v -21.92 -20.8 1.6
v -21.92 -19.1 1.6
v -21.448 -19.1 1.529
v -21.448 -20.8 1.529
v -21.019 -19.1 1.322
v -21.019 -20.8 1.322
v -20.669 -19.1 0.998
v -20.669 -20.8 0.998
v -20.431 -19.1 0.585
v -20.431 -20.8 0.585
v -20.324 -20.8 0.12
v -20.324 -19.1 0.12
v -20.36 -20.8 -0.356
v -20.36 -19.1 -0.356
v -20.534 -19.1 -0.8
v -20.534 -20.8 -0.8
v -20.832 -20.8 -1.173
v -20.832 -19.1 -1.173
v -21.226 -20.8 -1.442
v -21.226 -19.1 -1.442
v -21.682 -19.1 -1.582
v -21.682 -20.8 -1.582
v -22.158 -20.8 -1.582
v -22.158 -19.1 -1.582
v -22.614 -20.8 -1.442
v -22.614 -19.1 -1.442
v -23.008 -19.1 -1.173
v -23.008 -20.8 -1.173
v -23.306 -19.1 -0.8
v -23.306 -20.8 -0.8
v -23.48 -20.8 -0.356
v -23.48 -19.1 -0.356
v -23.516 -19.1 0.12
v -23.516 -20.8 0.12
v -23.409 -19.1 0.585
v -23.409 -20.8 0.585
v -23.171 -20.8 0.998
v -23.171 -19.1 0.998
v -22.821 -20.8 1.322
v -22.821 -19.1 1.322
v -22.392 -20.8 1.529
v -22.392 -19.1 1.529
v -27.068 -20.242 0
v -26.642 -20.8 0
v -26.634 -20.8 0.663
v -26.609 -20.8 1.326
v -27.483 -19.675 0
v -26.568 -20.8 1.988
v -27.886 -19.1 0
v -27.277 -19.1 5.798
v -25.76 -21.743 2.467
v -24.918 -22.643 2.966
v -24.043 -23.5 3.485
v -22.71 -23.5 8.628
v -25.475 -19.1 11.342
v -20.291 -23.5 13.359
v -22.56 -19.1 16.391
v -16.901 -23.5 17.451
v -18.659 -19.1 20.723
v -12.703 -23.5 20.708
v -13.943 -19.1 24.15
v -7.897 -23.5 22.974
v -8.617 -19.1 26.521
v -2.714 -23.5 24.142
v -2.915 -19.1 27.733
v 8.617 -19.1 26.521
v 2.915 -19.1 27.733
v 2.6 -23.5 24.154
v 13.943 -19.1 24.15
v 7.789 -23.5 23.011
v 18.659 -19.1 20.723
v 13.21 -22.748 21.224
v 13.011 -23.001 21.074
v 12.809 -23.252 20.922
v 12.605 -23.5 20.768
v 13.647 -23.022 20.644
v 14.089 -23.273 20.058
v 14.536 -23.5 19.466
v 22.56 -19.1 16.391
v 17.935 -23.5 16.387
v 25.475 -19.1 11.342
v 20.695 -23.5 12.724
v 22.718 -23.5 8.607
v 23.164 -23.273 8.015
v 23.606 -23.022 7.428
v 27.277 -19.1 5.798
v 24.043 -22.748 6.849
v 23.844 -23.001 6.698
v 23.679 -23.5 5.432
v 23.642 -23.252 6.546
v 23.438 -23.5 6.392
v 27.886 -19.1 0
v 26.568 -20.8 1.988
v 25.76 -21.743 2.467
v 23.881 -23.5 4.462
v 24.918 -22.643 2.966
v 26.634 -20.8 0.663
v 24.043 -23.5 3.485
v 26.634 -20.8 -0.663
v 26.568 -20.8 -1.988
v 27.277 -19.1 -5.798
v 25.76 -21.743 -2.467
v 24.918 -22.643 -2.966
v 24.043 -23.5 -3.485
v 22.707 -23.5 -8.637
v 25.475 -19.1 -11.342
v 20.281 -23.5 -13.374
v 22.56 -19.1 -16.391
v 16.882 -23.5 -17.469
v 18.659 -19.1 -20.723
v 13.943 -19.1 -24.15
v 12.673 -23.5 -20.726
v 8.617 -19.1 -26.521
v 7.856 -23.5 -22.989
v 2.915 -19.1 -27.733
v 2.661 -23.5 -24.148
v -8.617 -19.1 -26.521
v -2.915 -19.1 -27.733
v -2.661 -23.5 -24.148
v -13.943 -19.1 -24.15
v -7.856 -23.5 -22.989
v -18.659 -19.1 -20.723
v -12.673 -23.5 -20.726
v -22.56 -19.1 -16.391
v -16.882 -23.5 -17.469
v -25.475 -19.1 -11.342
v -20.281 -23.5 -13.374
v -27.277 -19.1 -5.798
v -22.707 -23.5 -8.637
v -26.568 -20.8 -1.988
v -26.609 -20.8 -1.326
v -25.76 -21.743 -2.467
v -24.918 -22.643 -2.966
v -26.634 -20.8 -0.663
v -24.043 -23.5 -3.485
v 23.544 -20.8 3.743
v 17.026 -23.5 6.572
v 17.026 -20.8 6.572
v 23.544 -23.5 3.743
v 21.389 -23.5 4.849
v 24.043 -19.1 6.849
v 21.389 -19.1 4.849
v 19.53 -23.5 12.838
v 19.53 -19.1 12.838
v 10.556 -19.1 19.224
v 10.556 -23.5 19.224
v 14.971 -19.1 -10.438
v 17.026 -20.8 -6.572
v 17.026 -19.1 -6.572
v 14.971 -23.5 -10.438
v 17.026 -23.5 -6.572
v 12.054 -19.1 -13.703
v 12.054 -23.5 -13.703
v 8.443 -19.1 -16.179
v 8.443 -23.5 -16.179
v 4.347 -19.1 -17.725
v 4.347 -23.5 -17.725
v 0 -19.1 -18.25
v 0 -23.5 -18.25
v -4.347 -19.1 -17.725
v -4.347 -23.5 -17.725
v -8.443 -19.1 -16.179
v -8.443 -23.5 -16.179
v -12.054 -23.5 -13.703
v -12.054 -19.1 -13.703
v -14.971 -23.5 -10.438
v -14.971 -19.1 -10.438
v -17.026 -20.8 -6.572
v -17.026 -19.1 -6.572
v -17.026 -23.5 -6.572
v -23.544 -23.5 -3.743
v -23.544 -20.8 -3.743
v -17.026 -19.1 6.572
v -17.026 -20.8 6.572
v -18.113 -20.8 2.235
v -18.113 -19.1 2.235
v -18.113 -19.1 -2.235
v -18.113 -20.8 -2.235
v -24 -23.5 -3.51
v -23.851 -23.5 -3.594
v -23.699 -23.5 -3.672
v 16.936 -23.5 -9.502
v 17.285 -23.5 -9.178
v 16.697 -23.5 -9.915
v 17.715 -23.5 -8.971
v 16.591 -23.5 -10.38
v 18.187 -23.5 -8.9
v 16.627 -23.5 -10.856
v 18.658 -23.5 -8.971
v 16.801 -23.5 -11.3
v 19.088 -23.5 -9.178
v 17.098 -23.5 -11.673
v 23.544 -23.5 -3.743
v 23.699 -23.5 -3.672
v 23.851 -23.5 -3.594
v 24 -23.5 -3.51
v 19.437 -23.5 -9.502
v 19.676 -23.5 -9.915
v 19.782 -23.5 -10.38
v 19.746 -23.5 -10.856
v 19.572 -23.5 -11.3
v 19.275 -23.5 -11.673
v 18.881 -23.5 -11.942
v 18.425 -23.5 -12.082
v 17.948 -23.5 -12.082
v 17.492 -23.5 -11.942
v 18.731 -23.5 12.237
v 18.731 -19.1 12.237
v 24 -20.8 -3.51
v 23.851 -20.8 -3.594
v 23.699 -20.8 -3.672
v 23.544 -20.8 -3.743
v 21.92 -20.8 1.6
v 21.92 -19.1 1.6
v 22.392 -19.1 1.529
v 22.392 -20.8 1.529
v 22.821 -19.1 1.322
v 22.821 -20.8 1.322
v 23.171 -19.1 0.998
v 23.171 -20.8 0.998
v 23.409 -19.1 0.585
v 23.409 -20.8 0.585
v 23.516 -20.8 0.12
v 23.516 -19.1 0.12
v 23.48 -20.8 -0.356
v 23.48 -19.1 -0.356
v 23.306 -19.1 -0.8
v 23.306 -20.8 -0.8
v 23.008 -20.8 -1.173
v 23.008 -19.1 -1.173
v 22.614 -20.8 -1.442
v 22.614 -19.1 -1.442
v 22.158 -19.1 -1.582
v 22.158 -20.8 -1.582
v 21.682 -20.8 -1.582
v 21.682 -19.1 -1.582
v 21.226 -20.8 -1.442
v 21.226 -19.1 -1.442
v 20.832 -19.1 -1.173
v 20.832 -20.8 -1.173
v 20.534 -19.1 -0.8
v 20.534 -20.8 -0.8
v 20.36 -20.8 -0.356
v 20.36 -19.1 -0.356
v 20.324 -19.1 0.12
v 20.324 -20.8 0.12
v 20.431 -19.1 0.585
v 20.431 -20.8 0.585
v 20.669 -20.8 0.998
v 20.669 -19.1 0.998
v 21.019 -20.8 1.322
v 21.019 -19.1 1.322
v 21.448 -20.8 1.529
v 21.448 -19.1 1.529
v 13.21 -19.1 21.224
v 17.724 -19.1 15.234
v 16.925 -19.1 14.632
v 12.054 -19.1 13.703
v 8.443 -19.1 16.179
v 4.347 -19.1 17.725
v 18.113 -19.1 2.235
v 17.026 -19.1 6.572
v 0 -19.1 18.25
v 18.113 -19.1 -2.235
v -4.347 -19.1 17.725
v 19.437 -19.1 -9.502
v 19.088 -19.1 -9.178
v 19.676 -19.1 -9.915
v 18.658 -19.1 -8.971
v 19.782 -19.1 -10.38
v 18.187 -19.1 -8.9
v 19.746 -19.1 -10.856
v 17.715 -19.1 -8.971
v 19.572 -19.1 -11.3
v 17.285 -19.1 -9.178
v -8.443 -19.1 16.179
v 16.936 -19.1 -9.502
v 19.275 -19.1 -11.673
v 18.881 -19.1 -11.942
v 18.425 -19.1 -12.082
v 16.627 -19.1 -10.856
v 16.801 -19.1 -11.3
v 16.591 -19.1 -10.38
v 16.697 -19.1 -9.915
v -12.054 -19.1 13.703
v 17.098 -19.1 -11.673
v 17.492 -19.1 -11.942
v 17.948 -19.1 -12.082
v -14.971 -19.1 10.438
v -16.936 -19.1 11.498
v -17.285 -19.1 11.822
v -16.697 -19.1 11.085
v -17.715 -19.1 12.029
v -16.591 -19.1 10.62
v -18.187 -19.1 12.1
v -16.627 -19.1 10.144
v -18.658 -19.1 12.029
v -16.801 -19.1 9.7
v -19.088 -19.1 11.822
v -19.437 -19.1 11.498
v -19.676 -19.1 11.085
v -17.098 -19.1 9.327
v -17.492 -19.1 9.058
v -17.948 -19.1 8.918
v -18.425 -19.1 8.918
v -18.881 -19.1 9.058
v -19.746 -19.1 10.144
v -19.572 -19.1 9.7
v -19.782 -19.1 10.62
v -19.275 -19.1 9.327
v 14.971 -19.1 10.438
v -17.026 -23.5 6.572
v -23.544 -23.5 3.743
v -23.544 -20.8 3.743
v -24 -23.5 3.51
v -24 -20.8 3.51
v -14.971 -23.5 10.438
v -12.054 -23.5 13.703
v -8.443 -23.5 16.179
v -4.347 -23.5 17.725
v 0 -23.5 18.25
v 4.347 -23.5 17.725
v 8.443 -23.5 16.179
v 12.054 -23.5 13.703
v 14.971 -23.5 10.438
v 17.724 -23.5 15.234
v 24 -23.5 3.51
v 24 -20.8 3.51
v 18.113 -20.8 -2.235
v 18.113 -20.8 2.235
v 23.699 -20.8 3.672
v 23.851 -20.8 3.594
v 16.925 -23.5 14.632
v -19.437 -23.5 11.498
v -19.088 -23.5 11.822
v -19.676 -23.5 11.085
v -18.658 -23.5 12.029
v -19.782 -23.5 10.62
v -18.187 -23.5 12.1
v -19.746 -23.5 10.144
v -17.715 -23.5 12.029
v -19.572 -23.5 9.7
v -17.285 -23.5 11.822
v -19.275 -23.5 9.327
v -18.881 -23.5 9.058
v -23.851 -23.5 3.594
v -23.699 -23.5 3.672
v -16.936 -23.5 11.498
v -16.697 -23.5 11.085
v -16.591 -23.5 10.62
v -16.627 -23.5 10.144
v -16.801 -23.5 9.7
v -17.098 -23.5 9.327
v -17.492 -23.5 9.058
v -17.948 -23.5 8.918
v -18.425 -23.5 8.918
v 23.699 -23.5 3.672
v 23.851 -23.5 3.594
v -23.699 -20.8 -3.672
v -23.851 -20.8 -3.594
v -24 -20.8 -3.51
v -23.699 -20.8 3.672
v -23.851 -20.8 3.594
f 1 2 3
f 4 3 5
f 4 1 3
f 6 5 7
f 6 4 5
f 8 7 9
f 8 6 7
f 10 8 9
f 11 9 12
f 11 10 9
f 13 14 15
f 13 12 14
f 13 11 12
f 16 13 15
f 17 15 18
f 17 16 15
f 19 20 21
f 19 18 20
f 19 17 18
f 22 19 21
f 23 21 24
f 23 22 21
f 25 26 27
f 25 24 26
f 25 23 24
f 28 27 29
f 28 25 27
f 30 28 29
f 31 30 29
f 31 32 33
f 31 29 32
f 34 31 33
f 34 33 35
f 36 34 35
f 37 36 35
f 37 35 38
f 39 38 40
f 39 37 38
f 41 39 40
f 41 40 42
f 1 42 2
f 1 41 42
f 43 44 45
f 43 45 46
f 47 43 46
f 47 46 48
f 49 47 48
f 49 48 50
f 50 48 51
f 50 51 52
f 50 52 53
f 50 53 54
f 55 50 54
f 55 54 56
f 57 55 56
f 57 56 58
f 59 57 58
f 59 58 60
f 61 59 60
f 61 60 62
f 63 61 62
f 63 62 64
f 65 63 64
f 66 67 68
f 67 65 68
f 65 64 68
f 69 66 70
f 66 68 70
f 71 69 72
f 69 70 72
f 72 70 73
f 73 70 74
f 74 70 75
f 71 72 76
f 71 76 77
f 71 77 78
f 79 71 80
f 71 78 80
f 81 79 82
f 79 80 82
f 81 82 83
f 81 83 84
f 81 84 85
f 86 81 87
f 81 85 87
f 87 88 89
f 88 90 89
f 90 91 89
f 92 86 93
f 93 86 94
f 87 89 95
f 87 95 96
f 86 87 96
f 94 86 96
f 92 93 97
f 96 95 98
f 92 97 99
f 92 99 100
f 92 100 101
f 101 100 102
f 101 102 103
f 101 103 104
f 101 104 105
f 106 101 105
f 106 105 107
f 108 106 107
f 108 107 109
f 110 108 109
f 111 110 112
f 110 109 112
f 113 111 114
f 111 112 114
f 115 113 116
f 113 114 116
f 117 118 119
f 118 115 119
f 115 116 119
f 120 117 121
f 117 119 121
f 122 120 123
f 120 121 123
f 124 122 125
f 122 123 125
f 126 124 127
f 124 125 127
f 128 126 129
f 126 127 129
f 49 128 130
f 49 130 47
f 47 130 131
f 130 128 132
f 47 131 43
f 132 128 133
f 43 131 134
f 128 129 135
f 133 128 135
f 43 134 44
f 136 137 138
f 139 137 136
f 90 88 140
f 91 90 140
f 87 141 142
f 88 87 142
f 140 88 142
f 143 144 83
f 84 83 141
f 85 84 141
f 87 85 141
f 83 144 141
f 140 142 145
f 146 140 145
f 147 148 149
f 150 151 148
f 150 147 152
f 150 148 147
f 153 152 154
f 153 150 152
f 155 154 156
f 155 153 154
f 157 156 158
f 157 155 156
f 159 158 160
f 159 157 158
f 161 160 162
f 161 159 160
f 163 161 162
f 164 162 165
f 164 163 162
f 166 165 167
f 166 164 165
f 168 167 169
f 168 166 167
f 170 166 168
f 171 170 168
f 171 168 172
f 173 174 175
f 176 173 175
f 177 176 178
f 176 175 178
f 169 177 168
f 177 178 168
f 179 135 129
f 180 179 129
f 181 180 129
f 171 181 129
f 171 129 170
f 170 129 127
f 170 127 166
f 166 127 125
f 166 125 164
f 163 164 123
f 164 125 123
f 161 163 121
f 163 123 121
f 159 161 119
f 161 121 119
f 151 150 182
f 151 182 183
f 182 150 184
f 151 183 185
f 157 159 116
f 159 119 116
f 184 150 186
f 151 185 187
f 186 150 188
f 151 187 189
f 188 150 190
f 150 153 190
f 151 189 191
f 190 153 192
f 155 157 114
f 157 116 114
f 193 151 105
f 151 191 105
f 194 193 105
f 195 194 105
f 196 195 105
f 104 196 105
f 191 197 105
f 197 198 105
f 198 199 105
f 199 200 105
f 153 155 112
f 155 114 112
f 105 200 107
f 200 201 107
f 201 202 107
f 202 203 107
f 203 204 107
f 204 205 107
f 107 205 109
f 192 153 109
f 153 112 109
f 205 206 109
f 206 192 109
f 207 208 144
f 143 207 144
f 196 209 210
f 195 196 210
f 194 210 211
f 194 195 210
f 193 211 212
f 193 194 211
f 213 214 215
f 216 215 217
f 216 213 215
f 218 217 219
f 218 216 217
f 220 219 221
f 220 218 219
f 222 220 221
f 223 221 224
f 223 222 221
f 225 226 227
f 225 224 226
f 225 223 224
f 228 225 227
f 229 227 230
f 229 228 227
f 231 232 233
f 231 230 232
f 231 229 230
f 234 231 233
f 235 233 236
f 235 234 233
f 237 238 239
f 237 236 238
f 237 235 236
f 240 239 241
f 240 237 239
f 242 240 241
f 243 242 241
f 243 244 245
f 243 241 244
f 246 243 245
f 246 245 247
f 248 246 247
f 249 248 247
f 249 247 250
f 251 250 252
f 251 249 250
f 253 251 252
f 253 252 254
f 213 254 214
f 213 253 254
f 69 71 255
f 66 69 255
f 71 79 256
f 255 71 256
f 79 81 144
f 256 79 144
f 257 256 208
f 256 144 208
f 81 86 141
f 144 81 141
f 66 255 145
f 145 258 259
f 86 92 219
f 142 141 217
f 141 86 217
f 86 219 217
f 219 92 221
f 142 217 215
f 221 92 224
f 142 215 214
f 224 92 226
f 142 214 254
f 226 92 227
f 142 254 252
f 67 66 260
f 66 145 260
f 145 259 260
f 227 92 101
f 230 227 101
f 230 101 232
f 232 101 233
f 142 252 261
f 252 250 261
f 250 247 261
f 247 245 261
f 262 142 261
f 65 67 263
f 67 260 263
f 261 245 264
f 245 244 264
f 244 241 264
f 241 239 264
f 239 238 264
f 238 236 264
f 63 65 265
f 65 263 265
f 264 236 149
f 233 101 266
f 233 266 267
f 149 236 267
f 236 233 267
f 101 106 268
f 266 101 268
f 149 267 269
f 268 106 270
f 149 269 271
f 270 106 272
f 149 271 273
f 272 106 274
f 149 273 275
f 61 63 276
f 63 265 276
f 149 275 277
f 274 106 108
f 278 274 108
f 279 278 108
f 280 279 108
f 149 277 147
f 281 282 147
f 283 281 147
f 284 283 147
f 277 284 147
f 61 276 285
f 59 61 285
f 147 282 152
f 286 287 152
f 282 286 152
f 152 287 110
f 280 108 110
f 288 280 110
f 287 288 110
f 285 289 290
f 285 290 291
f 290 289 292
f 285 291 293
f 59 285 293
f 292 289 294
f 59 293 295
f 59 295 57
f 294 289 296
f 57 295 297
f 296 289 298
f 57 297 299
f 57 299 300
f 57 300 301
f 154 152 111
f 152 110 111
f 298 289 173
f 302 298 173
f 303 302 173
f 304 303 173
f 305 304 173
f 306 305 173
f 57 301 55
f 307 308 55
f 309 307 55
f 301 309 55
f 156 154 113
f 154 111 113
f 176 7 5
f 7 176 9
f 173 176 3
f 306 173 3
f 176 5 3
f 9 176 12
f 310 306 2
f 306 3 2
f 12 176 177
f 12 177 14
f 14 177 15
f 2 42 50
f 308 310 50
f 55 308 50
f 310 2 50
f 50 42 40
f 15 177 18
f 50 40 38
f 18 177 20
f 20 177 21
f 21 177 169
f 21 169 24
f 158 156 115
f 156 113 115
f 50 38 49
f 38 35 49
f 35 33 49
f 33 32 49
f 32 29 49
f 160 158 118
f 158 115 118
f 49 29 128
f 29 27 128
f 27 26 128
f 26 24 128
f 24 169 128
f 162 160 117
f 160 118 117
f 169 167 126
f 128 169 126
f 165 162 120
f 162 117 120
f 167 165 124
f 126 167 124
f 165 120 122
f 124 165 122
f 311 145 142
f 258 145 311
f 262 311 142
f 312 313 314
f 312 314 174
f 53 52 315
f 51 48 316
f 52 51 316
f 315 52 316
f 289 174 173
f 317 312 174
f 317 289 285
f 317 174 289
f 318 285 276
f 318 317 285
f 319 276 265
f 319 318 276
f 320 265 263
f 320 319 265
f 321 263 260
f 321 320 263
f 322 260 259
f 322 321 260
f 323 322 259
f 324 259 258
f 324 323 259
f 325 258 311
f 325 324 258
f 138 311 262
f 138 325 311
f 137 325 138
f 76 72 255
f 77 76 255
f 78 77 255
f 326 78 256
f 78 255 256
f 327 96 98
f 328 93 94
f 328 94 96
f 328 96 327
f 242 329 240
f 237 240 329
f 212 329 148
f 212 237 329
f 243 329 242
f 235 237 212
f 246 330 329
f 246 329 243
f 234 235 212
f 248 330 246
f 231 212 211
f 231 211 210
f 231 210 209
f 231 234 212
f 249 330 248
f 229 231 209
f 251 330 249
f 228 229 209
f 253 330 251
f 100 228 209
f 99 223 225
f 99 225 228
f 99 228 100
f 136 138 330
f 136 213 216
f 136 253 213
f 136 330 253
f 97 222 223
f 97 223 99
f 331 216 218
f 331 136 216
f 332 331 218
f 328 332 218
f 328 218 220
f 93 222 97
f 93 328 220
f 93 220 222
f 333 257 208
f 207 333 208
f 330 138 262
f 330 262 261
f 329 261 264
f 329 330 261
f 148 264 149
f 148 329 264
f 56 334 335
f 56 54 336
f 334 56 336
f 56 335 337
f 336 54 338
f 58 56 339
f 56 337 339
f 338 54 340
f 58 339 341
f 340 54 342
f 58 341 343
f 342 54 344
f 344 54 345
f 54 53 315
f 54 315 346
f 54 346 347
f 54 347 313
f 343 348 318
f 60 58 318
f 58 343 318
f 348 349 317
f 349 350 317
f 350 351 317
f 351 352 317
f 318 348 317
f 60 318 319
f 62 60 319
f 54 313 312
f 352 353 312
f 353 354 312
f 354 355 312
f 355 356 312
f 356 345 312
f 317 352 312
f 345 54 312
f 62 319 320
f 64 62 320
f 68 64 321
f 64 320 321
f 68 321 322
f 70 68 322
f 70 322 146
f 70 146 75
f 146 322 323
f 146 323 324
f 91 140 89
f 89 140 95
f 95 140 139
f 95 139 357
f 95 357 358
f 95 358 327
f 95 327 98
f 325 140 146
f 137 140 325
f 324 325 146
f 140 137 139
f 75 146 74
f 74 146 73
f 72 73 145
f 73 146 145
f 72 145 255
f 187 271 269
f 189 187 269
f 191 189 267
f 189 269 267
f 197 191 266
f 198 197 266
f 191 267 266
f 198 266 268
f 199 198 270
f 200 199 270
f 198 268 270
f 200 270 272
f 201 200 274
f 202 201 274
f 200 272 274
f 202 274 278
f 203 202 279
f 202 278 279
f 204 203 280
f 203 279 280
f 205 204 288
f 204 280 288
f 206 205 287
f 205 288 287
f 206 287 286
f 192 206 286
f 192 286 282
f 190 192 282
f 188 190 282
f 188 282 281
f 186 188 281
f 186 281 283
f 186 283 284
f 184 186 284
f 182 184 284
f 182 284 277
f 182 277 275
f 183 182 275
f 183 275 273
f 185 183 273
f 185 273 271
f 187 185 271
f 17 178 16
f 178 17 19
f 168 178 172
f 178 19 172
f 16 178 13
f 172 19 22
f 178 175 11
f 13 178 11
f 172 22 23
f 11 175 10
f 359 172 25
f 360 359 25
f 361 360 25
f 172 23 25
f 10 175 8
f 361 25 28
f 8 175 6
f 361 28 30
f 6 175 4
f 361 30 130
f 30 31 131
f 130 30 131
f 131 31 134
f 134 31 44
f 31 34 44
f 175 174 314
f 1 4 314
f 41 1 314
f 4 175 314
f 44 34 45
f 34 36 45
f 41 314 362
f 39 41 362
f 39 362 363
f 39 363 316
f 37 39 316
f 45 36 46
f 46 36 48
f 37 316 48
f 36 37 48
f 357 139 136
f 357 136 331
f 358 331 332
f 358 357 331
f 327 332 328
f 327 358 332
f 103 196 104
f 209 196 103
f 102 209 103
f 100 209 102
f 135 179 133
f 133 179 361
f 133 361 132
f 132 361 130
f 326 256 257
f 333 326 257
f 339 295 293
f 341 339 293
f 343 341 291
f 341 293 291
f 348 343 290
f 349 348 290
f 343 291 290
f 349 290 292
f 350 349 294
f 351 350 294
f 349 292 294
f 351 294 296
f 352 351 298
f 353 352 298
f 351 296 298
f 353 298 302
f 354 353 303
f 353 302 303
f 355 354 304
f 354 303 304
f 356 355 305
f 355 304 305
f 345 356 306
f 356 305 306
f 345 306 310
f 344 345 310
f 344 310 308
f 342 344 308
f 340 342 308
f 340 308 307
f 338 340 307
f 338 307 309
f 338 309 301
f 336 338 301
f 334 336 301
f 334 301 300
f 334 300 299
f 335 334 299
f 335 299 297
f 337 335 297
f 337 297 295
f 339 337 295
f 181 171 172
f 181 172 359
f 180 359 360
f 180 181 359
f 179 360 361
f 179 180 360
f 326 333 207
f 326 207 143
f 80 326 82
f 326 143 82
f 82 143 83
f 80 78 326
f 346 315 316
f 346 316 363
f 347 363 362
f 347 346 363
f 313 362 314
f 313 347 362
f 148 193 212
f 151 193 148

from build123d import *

# Parameters (mm, degrees)
SKETCH2_R                = 33.8
CUT_EXTRUDE1_DEPTH       = 19.1
CUT_EXTRUDE2_START       = -33.8
CUT_EXTRUDE2_DEPTH       = 14.7
BOSS_EXTRUDE2_START      = -1.7
BOSS_EXTRUDE2_DEPTH      = 1.7
CUT_EXTRUDE3_REACH       = 42.172
SKETCH6_R                = 1.6
SKETCH19_R               = 9
CUT_EXTRUDE10_DEPTH      = 1.4
CUT_EXTRUDE11_REACH      = 42.429
CUT_EXTRUDE11_END_RADIUS = 33.8
SKETCH20_R               = 3.5
CUT_EXTRUDE9_REACH       = 44.024
CUT_EXTRUDE9_END_RADIUS  = 33.8
CUT_EXTRUDE7_REACH       = 44.024
CUT_EXTRUDE7_END_RADIUS  = 33.8
SKETCH10_R               = 1.6
CUT_EXTRUDE12_START      = -10.118299
SKETCH21_R               = 27.886018002
CUT_EXTRUDE12_DEPTH      = 10.118299
CUT_EXTRUDE13_REACH      = 41.529


# Read off the part's stored shape, not the designer's step: Revolve2
with BuildPart() as part:
    # Sketch1 → Revolve1 (revolve)
    with BuildSketch(Plane.XY, mode=Mode.PRIVATE) as revolve1_sk:
        with BuildLine():
            Line((0, -33.8), (0, 0))
            Line((0, 0), (33.8, 0))
            ThreePointArc((33.8, 0), (23.900209204, -23.900209204), (0, -33.8))
        make_face()
    revolve(revolve1_sk.sketch.rotate(Axis((0, -33.8, 0), (0, 1, 0)), 180), axis=Axis((0, -33.8, 0), (0, 1, 0)))

    # Sketch2 → Cut-Extrude1 (cut)
    with BuildSketch(Plane(origin=(0, 0, 0), x_dir=(1, 0, 0), z_dir=(0, 1, 0))):
        Circle(SKETCH2_R)
    extrude(amount=-CUT_EXTRUDE1_DEPTH, mode=Mode.SUBTRACT)

    # Sketch5 → Cut-Extrude2 (cut)
    with BuildSketch(Plane(origin=(0, 0, 0), x_dir=(1, 0, 0), z_dir=(0, 1, 0)).offset(CUT_EXTRUDE2_START)):
        with BuildLine():
            Line((-17.025732229, 6.571677263), (-23.544283672, 3.742739979))
            ThreePointArc((-23.544283672, 3.742739979), (-23.775794442, 3.633514413), (-24, 3.509985755))
            Line((-24, 3.509985755), (-24, -3.509985755))
            ThreePointArc((-24, -3.509985755), (-23.775794442, -3.633514413), (-23.544283672, -3.742739979))
            Line((-23.544283672, -3.742739979), (-17.025732229, -6.571677263))
            ThreePointArc((-17.025732229, -6.571677263), (0, -18.25), (17.025732229, -6.571677263))
            Line((17.025732229, -6.571677263), (23.544283672, -3.742739979))
            ThreePointArc((23.544283672, -3.742739979), (23.775794442, -3.633514413), (24, -3.509985755))
            Line((24, -3.509985755), (24, 3.509985755))
            ThreePointArc((24, 3.509985755), (23.775794442, 3.633514413), (23.544283672, 3.742739979))
            Line((23.544283672, 3.742739979), (17.025732229, 6.571677263))
            ThreePointArc((17.025732229, 6.571677263), (0, 18.25), (-17.025732229, 6.571677263))
        make_face()
    extrude(amount=CUT_EXTRUDE2_DEPTH, mode=Mode.SUBTRACT)

    # Sketch16 → Boss-Extrude2 (add)
    with BuildSketch(Plane(origin=(0, -19.1, 0), x_dir=(1, 0, 0), z_dir=(0, 1, 0)).offset(BOSS_EXTRUDE2_START)):
        with BuildLine():
            Line((17.025732229, 6.571677263), (23.544283672, 3.742739979))
            ThreePointArc((23.544283672, 3.742739979), (23.775794442, 3.633514413), (24, 3.509985755))
            Line((24, 3.509985755), (24, -3.509985755))
            ThreePointArc((24, -3.509985755), (23.775794442, -3.633514413), (23.544283672, -3.742739979))
            Line((23.544283672, -3.742739979), (17.025732229, -6.571677263))
            ThreePointArc((17.025732229, -6.571677263), (18.25, 0), (17.025732229, 6.571677263))
        make_face()
        with BuildLine():
            Line((-23.544283672, -3.742739979), (-17.025732229, -6.571677263))
            ThreePointArc((-17.025732229, -6.571677263), (-18.25, 0), (-17.025732229, 6.571677263))
            Line((-17.025732229, 6.571677263), (-23.544283672, 3.742739979))
            ThreePointArc((-23.544283672, 3.742739979), (-23.775794442, 3.633514413), (-24, 3.509985755))
            Line((-24, 3.509985755), (-24, -3.509985755))
            ThreePointArc((-24, -3.509985755), (-23.775794442, -3.633514413), (-23.544283672, -3.742739979))
        make_face()
    extrude(amount=BOSS_EXTRUDE2_DEPTH)

    # Sketch6 → Cut-Extrude3 (cut, up to next)
    with BuildSketch(Plane(origin=(0, -20.8, 0), x_dir=(1, 0, 0), z_dir=(0, 1, 0)), mode=Mode.PRIVATE) as cut_extrude3_sk1:
        with Locations(Location((-21.92, 0, 0), (0, 0, 270))):
            Circle(SKETCH6_R)
    cut_extrude3_tool1 = extrude(cut_extrude3_sk1.sketch, amount=CUT_EXTRUDE3_REACH, mode=Mode.PRIVATE) & part.part
    # Sketch6 → Cut-Extrude3 (cut, up to next)
    with BuildSketch(Plane(origin=(0, -20.8, 0), x_dir=(1, 0, 0), z_dir=(0, 1, 0)), mode=Mode.PRIVATE) as cut_extrude3_sk2:
        with Locations(Location((21.92, 0, 0), (0, 0, 270))):
            Circle(SKETCH6_R)
    cut_extrude3_tool2 = extrude(cut_extrude3_sk2.sketch, amount=CUT_EXTRUDE3_REACH, mode=Mode.PRIVATE) & part.part
    add(cut_extrude3_tool1.solids().sort_by_distance((-21.92, -20.8, 0))[0], mode=Mode.SUBTRACT)
    add(cut_extrude3_tool2.solids().sort_by_distance((21.92, -20.8, 0))[0], mode=Mode.SUBTRACT)

    # Revolve2 outline → Revolve2 (revolve)
    with BuildSketch(Plane.XY):
        with BuildLine():
            Line((0, -23.5), (0, -33.8))
            ThreePointArc((0, -33.8), (13.168073663, -31.129436808), (24.255308697, -23.53975361))
            Line((24.255308697, -23.53975361), (24.255308697, -23.5))
            Line((24.255308697, -23.5), (0, -23.5))
        make_face()
    revolve(axis=Axis((0, 0, 0), (0, 1, 0)))

    # Sketch19 → Cut-Extrude10 (cut)
    with BuildSketch(Plane(origin=(0, -23.5, 0), x_dir=(1, 0, 0), z_dir=(0, 1, 0))):
        with Locations(Location((0, 0, 0), (0, 0, 180))):
            Circle(SKETCH19_R)
    extrude(amount=-CUT_EXTRUDE10_DEPTH, mode=Mode.SUBTRACT)

    # Cut-Extrude11: up to this sphere (the profile starts inside it)
    cut_extrude11_end = Location((0, 0, 0)) * Sphere(CUT_EXTRUDE11_END_RADIUS, mode=Mode.PRIVATE)
    # Sketch20 → Cut-Extrude11 (cut, up to the surface)
    with BuildSketch(Plane(origin=(0, -24.9, 0), x_dir=(1, 0, 0), z_dir=(0, 1, 0)), mode=Mode.PRIVATE) as cut_extrude11_sk1:
        with Locations(Location((0, 0, 0), (0, 0, 180))):
            Circle(SKETCH20_R)
    cut_extrude11_tool1 = extrude(cut_extrude11_sk1.sketch, amount=-CUT_EXTRUDE11_REACH, mode=Mode.PRIVATE) & cut_extrude11_end
    add(cut_extrude11_tool1.solids().sort_by_distance((0, -24.9, 0))[0], mode=Mode.SUBTRACT)

    # Cut-Extrude9: up to this sphere (the profile starts inside it)
    cut_extrude9_end = Location((0, 0, 0)) * Sphere(CUT_EXTRUDE9_END_RADIUS, mode=Mode.PRIVATE)
    # Sketch13 → Cut-Extrude9 (cut, up to the surface)
    with BuildSketch(Plane(origin=(0, -19.1, 0), x_dir=(1, 0, 0), z_dir=(0, 1, 0)), mode=Mode.PRIVATE) as cut_extrude9_sk1:
        Polygon((10.556374993, -19.224020053), (13.210464636, -21.224020053), (17.724077309, -15.234253728), (16.925441799, -14.632438705), (18.730886869, -12.236532175), (19.529522379, -12.838347198), (24.043135053, -6.848580873), (21.389045409, -4.848580873), align=None)
    cut_extrude9_tool1 = extrude(cut_extrude9_sk1.sketch, amount=-CUT_EXTRUDE9_REACH, mode=Mode.PRIVATE) & cut_extrude9_end
    add(cut_extrude9_tool1.solids().sort_by_distance((17.250772, -19.1, 12.999389))[0], mode=Mode.SUBTRACT)

    # Cut-Extrude7: up to this sphere (the profile starts inside it)
    cut_extrude7_end = Location((0, 0, 0)) * Sphere(CUT_EXTRUDE7_END_RADIUS, mode=Mode.PRIVATE)
    # Sketch10 → Cut-Extrude7 (cut, up to the surface)
    with BuildSketch(Plane(origin=(0, -19.1, 0), x_dir=(1, 0, 0), z_dir=(0, 1, 0)), mode=Mode.PRIVATE) as cut_extrude7_sk1:
        with Locations(Location((-18.186533479, -10.5, 0), (0, 0, 270))):
            Circle(SKETCH10_R)
    cut_extrude7_tool1 = extrude(cut_extrude7_sk1.sketch, amount=-CUT_EXTRUDE7_REACH, mode=Mode.PRIVATE) & cut_extrude7_end
    add(cut_extrude7_tool1.solids().sort_by_distance((-18.186533, -19.1, 10.5))[0], mode=Mode.SUBTRACT)
    # Sketch10 → Cut-Extrude7 (cut, up to the surface)
    with BuildSketch(Plane(origin=(0, -19.1, 0), x_dir=(1, 0, 0), z_dir=(0, 1, 0)), mode=Mode.PRIVATE) as cut_extrude7_sk2:
        with Locations(Location((18.186533479, 10.5, 0), (0, 0, 270))):
            Circle(SKETCH10_R)
    cut_extrude7_tool2 = extrude(cut_extrude7_sk2.sketch, amount=-CUT_EXTRUDE7_REACH, mode=Mode.PRIVATE) & cut_extrude7_end
    add(cut_extrude7_tool2.solids().sort_by_distance((18.186533, -19.1, -10.5))[0], mode=Mode.SUBTRACT)

    # Sketch21 → Cut-Extrude12 (cut)
    with BuildSketch(Plane(origin=(0, -23.5, 0), x_dir=(1, 0, 0), z_dir=(0, 1, 0)).offset(CUT_EXTRUDE12_START)):
        Circle(SKETCH21_R)
    extrude(amount=CUT_EXTRUDE12_DEPTH, mode=Mode.SUBTRACT)

    # Sketch23 → Cut-Extrude13 (cut, up to next)
    with BuildSketch(Plane.XZ.offset(20.8), mode=Mode.PRIVATE) as cut_extrude13_sk1:
        Polygon((24, 3.509985755), (24, -3.509985755), (29.923076923, 0), align=None)
    cut_extrude13_tool1 = extrude(cut_extrude13_sk1.sketch, amount=CUT_EXTRUDE13_REACH, mode=Mode.PRIVATE) & part.part
    # Sketch23 → Cut-Extrude13 (cut, up to next)
    with BuildSketch(Plane.XZ.offset(20.8), mode=Mode.PRIVATE) as cut_extrude13_sk2:
        Polygon((-24, 3.509985755), (-24, -3.509985755), (-29.923076923, 0), align=None)
    cut_extrude13_tool2 = extrude(cut_extrude13_sk2.sketch, amount=CUT_EXTRUDE13_REACH, mode=Mode.PRIVATE) & part.part
    add(cut_extrude13_tool1.solids().sort_by_distance((25.974359, -20.8, 0))[0], mode=Mode.SUBTRACT)
    add(cut_extrude13_tool2.solids().sort_by_distance((-25.974359, -20.8, 0))[0], mode=Mode.SUBTRACT)


solid = part.part
